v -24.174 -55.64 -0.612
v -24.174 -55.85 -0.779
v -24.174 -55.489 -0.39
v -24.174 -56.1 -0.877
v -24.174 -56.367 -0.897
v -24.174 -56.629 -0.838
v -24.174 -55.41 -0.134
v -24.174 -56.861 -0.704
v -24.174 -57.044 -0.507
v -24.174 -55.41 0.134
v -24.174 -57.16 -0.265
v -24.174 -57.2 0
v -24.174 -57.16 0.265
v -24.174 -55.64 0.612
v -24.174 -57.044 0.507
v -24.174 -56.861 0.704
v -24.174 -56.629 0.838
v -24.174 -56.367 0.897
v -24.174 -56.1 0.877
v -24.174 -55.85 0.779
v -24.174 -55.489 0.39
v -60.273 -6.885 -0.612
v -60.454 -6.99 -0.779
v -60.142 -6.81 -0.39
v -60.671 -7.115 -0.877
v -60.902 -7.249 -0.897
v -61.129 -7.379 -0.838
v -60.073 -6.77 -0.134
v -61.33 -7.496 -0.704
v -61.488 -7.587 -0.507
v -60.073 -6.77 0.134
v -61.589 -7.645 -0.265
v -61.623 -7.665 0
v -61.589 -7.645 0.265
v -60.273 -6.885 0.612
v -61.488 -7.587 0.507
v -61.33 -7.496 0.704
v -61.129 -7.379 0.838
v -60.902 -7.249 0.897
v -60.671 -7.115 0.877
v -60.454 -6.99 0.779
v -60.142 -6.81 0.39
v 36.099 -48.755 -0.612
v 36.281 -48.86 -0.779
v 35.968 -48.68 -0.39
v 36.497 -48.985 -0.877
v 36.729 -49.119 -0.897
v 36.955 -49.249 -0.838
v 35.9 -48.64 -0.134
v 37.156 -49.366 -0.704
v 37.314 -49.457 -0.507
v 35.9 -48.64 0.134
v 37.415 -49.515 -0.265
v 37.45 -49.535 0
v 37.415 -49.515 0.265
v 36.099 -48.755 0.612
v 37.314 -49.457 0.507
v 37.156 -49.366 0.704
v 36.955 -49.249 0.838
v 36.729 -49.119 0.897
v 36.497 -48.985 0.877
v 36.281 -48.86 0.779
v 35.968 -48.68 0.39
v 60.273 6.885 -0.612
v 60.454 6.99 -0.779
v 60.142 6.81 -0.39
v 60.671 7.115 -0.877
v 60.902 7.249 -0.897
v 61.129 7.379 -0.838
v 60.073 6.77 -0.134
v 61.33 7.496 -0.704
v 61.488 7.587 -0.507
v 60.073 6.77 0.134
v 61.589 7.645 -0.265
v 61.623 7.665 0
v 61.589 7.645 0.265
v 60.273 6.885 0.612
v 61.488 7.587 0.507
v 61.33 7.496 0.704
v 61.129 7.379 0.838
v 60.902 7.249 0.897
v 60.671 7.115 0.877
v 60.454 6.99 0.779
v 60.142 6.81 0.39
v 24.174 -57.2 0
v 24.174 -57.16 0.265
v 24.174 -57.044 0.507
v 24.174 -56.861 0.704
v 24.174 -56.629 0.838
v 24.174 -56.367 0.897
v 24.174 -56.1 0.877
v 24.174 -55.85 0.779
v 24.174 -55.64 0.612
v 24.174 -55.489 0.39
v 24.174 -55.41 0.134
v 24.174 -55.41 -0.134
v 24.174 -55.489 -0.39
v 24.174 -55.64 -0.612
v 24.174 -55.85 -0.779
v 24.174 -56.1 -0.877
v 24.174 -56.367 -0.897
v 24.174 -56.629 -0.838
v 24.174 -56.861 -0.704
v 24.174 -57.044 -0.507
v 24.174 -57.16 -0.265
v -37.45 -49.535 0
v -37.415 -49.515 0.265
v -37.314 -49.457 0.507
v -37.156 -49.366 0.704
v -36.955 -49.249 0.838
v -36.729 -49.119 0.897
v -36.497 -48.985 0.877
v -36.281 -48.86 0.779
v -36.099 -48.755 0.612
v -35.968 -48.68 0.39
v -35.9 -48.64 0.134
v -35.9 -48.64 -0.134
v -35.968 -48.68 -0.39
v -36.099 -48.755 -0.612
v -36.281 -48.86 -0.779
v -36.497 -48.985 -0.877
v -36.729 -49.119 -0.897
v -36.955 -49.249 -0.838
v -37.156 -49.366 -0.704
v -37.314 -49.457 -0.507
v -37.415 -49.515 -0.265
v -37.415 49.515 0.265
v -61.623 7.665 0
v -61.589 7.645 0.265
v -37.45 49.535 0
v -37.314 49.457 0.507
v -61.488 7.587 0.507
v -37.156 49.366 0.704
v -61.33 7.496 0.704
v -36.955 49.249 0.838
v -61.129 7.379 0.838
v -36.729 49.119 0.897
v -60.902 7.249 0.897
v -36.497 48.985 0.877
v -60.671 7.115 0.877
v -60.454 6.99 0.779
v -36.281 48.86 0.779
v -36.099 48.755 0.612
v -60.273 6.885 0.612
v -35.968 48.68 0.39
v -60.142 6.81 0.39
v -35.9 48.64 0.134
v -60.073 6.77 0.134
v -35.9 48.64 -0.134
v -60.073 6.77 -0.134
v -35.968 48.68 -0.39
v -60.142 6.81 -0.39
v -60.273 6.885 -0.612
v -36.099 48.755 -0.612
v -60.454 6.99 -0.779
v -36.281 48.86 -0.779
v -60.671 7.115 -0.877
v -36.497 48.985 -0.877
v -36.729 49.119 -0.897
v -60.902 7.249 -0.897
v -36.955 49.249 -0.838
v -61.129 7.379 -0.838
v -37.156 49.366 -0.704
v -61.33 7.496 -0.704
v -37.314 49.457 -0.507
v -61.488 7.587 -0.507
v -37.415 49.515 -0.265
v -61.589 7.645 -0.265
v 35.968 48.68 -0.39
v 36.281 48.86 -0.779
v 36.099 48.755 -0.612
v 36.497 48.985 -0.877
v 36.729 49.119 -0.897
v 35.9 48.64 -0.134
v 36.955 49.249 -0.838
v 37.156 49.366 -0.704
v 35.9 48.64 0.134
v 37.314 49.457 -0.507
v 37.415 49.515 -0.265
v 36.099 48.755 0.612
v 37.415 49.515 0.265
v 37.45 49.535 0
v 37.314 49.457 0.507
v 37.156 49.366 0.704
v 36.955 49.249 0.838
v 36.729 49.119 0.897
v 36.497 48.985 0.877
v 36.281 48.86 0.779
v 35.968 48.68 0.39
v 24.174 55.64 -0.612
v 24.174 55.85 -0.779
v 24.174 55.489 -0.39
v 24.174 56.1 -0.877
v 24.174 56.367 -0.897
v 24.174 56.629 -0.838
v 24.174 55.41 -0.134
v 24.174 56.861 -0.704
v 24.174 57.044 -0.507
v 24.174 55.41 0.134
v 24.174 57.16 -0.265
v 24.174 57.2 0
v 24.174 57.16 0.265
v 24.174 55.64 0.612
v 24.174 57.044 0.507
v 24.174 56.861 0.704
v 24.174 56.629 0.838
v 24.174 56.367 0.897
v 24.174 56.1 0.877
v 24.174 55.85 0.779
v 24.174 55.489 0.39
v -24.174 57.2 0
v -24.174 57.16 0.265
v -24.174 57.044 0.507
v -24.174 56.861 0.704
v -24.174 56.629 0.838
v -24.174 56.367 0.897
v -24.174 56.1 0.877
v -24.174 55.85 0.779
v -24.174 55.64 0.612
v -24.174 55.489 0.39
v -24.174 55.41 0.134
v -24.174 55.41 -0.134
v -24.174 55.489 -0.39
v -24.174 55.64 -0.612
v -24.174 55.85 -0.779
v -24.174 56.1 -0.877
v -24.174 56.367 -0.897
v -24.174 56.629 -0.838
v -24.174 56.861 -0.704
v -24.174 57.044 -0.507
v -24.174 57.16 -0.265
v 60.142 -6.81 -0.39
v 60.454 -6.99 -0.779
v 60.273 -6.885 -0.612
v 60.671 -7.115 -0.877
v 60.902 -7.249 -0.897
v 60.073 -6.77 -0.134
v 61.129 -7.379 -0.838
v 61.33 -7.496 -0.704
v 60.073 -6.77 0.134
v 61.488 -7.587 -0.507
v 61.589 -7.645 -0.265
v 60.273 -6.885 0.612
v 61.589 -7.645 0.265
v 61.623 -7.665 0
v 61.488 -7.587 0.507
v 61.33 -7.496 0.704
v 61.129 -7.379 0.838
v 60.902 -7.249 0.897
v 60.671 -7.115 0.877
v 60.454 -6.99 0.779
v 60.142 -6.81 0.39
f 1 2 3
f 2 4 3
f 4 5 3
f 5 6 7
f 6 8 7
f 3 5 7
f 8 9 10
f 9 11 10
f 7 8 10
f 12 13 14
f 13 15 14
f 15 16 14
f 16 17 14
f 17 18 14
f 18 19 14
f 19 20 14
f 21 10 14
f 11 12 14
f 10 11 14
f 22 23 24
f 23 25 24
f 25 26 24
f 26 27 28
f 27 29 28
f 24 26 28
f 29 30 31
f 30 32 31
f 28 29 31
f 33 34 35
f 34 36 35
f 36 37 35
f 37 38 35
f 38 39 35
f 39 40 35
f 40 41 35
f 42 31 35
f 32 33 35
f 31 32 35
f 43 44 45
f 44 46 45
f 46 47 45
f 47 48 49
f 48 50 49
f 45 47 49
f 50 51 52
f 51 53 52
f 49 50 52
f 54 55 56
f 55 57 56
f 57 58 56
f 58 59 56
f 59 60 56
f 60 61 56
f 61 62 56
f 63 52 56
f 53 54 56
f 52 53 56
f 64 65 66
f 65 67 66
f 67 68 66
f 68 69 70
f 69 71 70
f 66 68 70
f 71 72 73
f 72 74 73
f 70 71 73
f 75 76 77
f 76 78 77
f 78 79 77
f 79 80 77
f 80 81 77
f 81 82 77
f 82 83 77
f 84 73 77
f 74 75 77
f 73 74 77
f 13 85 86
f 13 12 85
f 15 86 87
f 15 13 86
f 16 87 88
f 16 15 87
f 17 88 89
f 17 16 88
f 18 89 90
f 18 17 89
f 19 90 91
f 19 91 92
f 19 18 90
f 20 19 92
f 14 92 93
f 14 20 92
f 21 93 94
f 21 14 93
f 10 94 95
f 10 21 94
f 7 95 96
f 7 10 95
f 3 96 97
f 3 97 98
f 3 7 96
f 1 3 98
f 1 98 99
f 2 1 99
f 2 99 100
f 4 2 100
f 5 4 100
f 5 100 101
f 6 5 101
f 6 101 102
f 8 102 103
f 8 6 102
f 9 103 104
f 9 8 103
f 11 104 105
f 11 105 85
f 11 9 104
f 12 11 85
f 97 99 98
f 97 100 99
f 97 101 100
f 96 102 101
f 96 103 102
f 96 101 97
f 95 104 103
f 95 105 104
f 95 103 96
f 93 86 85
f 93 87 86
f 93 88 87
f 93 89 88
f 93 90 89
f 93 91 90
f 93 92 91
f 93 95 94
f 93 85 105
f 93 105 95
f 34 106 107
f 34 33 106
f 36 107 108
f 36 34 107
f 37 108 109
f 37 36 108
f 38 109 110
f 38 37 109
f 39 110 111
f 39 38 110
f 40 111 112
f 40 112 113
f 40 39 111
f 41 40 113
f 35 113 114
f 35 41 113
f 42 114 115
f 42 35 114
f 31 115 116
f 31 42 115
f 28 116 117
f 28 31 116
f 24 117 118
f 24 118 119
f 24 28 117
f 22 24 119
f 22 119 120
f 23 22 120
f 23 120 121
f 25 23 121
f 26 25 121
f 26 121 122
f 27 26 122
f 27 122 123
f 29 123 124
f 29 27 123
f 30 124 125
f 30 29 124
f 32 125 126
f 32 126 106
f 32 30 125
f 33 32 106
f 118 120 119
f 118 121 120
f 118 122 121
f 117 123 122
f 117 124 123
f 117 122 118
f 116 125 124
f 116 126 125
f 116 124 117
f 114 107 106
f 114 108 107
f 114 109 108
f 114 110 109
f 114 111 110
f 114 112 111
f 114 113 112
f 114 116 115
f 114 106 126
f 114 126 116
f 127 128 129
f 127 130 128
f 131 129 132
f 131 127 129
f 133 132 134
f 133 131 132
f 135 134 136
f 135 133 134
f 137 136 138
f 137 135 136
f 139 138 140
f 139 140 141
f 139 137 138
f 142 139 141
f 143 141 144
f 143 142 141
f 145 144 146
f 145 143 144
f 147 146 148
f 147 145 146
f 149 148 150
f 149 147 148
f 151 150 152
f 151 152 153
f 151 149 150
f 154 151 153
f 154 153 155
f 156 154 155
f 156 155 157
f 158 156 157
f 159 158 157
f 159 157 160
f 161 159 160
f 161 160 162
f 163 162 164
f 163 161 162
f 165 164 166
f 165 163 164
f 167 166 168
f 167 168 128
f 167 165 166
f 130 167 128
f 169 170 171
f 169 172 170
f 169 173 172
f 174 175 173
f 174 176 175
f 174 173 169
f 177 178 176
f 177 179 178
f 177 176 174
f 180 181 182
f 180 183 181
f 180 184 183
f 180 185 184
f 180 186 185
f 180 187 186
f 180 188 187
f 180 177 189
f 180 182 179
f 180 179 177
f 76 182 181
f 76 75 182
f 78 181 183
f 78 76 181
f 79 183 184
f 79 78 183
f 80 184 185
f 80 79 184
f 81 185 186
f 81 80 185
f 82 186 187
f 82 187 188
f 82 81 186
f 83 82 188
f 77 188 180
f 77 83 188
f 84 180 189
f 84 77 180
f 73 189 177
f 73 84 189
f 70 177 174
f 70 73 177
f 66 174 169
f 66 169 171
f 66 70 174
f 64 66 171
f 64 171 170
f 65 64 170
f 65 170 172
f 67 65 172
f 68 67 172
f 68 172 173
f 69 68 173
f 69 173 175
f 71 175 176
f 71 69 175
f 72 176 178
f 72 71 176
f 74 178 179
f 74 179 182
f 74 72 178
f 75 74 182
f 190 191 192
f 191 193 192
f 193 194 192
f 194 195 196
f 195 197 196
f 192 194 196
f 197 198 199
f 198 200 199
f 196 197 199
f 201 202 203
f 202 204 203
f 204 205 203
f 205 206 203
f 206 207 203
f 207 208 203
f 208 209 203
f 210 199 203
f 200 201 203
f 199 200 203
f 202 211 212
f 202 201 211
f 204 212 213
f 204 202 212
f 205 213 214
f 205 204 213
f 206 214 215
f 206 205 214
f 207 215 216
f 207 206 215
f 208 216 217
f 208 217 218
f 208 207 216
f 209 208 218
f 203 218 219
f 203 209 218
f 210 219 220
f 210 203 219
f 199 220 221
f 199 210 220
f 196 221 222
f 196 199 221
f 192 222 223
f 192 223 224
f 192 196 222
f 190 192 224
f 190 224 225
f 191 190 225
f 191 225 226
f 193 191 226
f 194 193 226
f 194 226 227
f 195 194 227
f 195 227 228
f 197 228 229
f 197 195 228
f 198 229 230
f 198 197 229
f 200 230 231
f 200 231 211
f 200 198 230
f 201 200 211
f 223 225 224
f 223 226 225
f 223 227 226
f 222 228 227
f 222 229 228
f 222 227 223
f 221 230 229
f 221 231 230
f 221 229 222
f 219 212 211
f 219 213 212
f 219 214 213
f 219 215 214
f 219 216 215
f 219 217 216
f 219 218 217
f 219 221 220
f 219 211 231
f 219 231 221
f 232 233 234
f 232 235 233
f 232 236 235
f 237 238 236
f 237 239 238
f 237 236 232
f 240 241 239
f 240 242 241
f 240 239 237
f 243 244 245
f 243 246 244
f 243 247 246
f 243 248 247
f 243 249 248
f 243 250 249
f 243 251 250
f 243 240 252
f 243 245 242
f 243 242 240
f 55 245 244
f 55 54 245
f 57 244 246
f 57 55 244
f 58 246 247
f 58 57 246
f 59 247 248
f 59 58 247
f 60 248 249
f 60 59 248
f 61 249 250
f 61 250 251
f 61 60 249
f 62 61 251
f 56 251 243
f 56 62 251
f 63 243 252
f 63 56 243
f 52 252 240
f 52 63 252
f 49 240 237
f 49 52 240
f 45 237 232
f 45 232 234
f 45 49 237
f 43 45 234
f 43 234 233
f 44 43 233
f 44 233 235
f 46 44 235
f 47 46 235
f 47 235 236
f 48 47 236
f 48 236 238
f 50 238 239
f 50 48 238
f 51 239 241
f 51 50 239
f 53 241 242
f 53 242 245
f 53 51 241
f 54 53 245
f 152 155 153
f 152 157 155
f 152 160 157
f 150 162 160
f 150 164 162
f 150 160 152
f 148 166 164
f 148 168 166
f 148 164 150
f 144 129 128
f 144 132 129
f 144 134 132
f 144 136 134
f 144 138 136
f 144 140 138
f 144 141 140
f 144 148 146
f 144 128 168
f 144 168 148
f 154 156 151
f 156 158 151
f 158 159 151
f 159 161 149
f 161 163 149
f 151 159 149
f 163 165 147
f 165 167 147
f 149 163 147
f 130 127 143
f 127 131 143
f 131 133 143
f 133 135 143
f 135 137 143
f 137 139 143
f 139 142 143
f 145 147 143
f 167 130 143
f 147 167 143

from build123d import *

# Parameters (mm, degrees)
MASTER_SKETCH_W   = 48.347295252
MASTER_SKETCH_H   = 0.9
CIRPATTERN1_COUNT = 6


with BuildPart() as part:
    # Master Sketch → Revolve1 (revolve)
    with BuildSketch(Plane.XY):
        with Locations((0, 56.75)):
            Rectangle(MASTER_SKETCH_W, MASTER_SKETCH_H)
    revolve(axis=Axis((-24.173647626, 56.3, 0), (1, 0, 0)))


with BuildPart() as cirpattern1_1:
    # CirPattern1: pattern copy
    add(part.part.rotate(Axis((0, 0, 0), (0, 0, 1)), 1 * 360 / CIRPATTERN1_COUNT))


with BuildPart() as cirpattern1_2:
    # CirPattern1: pattern copy
    add(part.part.rotate(Axis((0, 0, 0), (0, 0, 1)), 2 * 360 / CIRPATTERN1_COUNT))


with BuildPart() as cirpattern1_3:
    # CirPattern1: pattern copy
    add(part.part.rotate(Axis((0, 0, 0), (0, 0, 1)), 3 * 360 / CIRPATTERN1_COUNT))


with BuildPart() as cirpattern1_4:
    # CirPattern1: pattern copy
    add(part.part.rotate(Axis((0, 0, 0), (0, 0, 1)), 4 * 360 / CIRPATTERN1_COUNT))


with BuildPart() as cirpattern1_5:
    # CirPattern1: pattern copy
    add(part.part.rotate(Axis((0, 0, 0), (0, 0, 1)), 5 * 360 / CIRPATTERN1_COUNT))


solid = Compound([part.part, cirpattern1_1.part, cirpattern1_2.part, cirpattern1_3.part, cirpattern1_4.part, cirpattern1_5.part])
